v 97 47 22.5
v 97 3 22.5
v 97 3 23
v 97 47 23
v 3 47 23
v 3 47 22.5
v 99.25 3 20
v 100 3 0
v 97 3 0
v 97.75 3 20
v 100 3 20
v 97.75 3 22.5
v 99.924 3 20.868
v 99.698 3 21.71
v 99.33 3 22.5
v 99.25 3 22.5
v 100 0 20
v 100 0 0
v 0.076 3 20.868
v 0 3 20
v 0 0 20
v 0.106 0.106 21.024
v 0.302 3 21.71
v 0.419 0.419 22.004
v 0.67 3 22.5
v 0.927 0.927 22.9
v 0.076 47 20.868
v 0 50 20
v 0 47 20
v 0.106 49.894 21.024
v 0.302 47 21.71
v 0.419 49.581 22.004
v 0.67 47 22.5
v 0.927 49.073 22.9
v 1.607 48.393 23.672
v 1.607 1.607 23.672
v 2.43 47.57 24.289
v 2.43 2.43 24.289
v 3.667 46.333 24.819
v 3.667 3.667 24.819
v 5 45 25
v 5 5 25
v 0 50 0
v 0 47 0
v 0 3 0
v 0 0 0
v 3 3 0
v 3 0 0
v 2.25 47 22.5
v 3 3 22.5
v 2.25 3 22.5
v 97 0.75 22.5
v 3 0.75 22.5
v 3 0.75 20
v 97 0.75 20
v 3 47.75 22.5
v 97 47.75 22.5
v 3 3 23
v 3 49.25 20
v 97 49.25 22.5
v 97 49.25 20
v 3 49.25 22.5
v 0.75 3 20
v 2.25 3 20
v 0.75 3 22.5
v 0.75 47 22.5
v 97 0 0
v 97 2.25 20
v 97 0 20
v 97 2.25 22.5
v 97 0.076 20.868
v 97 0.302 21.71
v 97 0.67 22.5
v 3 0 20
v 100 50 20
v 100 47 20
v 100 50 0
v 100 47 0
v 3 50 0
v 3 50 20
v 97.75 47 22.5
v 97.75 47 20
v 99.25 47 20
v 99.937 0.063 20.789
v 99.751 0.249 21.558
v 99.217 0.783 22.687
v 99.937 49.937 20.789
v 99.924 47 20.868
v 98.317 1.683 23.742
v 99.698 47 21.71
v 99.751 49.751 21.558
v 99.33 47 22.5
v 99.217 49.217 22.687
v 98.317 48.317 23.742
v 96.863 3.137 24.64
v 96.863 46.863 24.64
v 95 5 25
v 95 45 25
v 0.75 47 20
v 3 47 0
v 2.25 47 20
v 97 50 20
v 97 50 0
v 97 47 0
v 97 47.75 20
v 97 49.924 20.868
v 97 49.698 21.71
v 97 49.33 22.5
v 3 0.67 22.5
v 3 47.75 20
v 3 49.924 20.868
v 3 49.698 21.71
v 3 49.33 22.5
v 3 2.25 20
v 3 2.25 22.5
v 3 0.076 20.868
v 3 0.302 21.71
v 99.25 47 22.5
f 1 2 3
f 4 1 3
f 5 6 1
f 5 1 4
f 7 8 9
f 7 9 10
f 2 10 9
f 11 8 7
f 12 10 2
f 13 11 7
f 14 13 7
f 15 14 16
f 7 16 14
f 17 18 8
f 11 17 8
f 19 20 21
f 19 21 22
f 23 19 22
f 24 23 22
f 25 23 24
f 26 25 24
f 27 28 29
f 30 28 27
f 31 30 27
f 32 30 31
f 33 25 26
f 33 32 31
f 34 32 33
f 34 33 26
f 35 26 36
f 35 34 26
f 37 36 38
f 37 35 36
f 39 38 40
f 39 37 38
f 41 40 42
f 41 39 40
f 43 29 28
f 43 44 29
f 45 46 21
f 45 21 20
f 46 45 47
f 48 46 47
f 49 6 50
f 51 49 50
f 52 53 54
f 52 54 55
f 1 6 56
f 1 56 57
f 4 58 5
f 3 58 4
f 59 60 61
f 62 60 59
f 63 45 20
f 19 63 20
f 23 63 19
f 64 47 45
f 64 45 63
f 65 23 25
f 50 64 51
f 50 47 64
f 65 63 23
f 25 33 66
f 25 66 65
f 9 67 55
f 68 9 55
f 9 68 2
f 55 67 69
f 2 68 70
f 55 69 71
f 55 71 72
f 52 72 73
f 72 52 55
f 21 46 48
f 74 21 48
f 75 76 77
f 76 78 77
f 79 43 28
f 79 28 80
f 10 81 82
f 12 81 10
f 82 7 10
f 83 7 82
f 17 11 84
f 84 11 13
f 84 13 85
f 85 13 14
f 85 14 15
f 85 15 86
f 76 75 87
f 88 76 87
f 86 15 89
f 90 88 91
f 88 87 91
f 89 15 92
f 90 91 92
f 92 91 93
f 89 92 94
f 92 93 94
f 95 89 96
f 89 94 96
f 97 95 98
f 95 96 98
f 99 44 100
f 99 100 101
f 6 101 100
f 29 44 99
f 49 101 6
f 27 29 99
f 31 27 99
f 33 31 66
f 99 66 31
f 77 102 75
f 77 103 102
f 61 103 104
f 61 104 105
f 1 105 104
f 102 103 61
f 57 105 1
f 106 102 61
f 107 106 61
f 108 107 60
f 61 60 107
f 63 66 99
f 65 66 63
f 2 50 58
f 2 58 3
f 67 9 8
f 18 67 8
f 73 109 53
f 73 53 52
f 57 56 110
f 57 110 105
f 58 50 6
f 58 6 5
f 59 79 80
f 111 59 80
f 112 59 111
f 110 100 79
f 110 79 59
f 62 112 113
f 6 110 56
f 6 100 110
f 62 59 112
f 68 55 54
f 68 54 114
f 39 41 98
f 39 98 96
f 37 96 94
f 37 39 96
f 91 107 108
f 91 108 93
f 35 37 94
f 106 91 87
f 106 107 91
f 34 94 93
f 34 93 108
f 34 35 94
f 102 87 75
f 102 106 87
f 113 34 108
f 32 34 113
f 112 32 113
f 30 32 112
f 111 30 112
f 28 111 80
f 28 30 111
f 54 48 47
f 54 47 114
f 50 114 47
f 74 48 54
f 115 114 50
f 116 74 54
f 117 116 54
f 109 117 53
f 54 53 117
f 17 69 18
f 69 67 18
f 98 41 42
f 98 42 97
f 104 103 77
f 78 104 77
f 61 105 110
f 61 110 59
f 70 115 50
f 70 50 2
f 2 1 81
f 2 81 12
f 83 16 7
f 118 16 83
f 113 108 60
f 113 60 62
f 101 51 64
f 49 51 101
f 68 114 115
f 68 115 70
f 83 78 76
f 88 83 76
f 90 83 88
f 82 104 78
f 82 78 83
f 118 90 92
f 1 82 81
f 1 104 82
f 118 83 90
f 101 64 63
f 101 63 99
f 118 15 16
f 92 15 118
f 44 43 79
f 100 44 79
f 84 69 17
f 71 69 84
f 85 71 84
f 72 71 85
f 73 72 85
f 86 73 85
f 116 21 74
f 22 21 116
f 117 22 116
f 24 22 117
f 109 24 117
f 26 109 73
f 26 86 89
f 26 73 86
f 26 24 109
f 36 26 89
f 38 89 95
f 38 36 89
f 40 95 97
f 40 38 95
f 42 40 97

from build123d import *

# Parameters (mm, degrees)
F0_W         = 100
F0_H         = 50
F1_DEPTH     = 25
F3_W         = 44
F3_H         = 20
F4_DEPTH     = 100.001
F2_W         = 94
F2_H         = 20
F5_DEPTH     = 50.001
F6_W         = 94
F6_H         = 44
F6_H_2       = 0.75
F7_DEPTH     = 2.5
F8_DEPTH     = 3
F2_H_2       = 2.5
F9_DEPTH     = 0.75
F10_W        = 44
F10_H        = 2.5
F11_DEPTH    = 0.75
F13_DEPTH    = 0.75
F14_W        = 44
F14_H        = 2.5
F15_DEPTH    = 0.75
F16_W        = 44
F16_H        = 2.5
F17_DEPTH    = 0.75
F18_W        = 94
F18_H        = 2.5
F19_DEPTH    = 0.75
F20_W        = 94
F20_H        = 2.5
F21_DEPTH    = 0.75
F22_T1_DEPTH = 75
F22_T3_DEPTH = 125


# Not quite as in the source:
# - a fillet or chamfer that OpenCascade refuses, or shapes differently, is made with other operations: its cross-section is extruded or revolved along the edge and cut away or added


with BuildPart() as f1:
    # F0 (on Top) → F1 (new body)
    with BuildSketch(Plane.XY):
        with Locations((50, 25)):
            Rectangle(F0_W, F0_H)
    extrude(amount=F1_DEPTH)

    # F3 (on face) → F4 (cut, through all)
    with BuildSketch(Plane.YZ.offset(100)):
        with Locations((25, 10)):
            Rectangle(F3_W, F3_H)
    extrude(amount=-F4_DEPTH, mode=Mode.SUBTRACT)

    # F2 (on face) → F5 (cut, through all)
    with BuildSketch(Plane.XZ):
        with Locations((50, 10)):
            Rectangle(F2_W, F2_H)
    extrude(amount=-F5_DEPTH, mode=Mode.SUBTRACT)

    # F6 (on face) → F7 (cut)
    with BuildSketch(Plane(origin=(0, 0, 20), x_dir=(1, 0, 0), z_dir=(0, 0, -1))):
        with Locations((50, -25)):
            Rectangle(F6_W, F6_H)
        with Locations((50, -2.625)):
            Rectangle(F6_W, F6_H_2)
    extrude(amount=-F7_DEPTH, mode=Mode.SUBTRACT)

    # F6 (on face) → F8 (cut)
    with BuildSketch(Plane(origin=(0, 0, 20), x_dir=(1, 0, 0), z_dir=(0, 0, -1))):
        with Locations((50, -25)):
            Rectangle(F6_W, F6_H)
    extrude(amount=-F8_DEPTH, mode=Mode.SUBTRACT)

    # F2 (on face) → F9 (cut)
    with BuildSketch(Plane.XZ):
        with Locations((50, 21.25)):
            Rectangle(F2_W, F2_H_2)
    extrude(amount=-F9_DEPTH, mode=Mode.SUBTRACT)

    # F10 (on face) → F11 (cut)
    with BuildSketch(Plane(origin=(0, 0, 0), x_dir=(0, -1, 0), z_dir=(-1, 0, 0))):
        with Locations((-25, 21.25)):
            Rectangle(F10_W, F10_H)
    extrude(amount=-F11_DEPTH, mode=Mode.SUBTRACT)

    # F12 (on face) → F13 (cut)
    with BuildSketch(Plane.YZ.offset(3)):
        Polygon((3, 22.5), (3, 20), (47, 20), (47, 21.5), (47, 22.5), align=None)
    extrude(amount=-F13_DEPTH, mode=Mode.SUBTRACT)

    # F14 (on face) → F15 (cut)
    with BuildSketch(Plane.YZ.offset(100)):
        with Locations((25, 21.25)):
            Rectangle(F14_W, F14_H)
    extrude(amount=-F15_DEPTH, mode=Mode.SUBTRACT)

    # F16 (on face) → F17 (cut)
    with BuildSketch(Plane(origin=(97, 0, 0), x_dir=(0, -1, 0), z_dir=(-1, 0, 0))):
        with Locations((-25, 21.25)):
            Rectangle(F16_W, F16_H)
    extrude(amount=-F17_DEPTH, mode=Mode.SUBTRACT)

    # F18 (on face) → F19 (cut)
    with BuildSketch(Plane(origin=(0, 50, 0), x_dir=(-1, 0, 0), z_dir=(0, 1, 0))):
        with Locations((-50, 21.25)):
            Rectangle(F18_W, F18_H)
    extrude(amount=-F19_DEPTH, mode=Mode.SUBTRACT)

    # F20 (on face) → F21 (cut)
    with BuildSketch(Plane.XZ.offset(-47)):
        with Locations((50, 21.25)):
            Rectangle(F20_W, F20_H)
    extrude(amount=-F21_DEPTH, mode=Mode.SUBTRACT)

    # F22: fillet of radius 5 on 4 edges, made by hand

    # F22_s2 → F22_t1 (cut)
    with BuildSketch(Plane.XZ.offset(-62.5)):
        with BuildLine():
            ThreePointArc((0, 20), (1.4644660941, 23.5355339059), (5, 25))
            Line((5, 25), (0, 25))
            Line((0, 25), (0, 20))
        make_face()
        with BuildLine():
            ThreePointArc((100, 20), (98.5355339059, 23.5355339059), (95, 25))
            Line((95, 25), (100, 25))
            Line((100, 25), (100, 20))
        make_face()
    extrude(amount=F22_T1_DEPTH, mode=Mode.SUBTRACT)

    # F22_s4 → F22_t3 (cut)
    with BuildSketch(Plane.YZ.offset(-12.5)):
        with BuildLine():
            ThreePointArc((0, 20), (1.4644660941, 23.5355339059), (5, 25))
            Line((5, 25), (0, 25))
            Line((0, 25), (0, 20))
        make_face()
        with BuildLine():
            ThreePointArc((45, 25), (48.5355339059, 23.5355339059), (50, 20))
            Line((50, 20), (50, 25))
            Line((50, 25), (45, 25))
        make_face()
    extrude(amount=F22_T3_DEPTH, mode=Mode.SUBTRACT)


solid = f1.part
